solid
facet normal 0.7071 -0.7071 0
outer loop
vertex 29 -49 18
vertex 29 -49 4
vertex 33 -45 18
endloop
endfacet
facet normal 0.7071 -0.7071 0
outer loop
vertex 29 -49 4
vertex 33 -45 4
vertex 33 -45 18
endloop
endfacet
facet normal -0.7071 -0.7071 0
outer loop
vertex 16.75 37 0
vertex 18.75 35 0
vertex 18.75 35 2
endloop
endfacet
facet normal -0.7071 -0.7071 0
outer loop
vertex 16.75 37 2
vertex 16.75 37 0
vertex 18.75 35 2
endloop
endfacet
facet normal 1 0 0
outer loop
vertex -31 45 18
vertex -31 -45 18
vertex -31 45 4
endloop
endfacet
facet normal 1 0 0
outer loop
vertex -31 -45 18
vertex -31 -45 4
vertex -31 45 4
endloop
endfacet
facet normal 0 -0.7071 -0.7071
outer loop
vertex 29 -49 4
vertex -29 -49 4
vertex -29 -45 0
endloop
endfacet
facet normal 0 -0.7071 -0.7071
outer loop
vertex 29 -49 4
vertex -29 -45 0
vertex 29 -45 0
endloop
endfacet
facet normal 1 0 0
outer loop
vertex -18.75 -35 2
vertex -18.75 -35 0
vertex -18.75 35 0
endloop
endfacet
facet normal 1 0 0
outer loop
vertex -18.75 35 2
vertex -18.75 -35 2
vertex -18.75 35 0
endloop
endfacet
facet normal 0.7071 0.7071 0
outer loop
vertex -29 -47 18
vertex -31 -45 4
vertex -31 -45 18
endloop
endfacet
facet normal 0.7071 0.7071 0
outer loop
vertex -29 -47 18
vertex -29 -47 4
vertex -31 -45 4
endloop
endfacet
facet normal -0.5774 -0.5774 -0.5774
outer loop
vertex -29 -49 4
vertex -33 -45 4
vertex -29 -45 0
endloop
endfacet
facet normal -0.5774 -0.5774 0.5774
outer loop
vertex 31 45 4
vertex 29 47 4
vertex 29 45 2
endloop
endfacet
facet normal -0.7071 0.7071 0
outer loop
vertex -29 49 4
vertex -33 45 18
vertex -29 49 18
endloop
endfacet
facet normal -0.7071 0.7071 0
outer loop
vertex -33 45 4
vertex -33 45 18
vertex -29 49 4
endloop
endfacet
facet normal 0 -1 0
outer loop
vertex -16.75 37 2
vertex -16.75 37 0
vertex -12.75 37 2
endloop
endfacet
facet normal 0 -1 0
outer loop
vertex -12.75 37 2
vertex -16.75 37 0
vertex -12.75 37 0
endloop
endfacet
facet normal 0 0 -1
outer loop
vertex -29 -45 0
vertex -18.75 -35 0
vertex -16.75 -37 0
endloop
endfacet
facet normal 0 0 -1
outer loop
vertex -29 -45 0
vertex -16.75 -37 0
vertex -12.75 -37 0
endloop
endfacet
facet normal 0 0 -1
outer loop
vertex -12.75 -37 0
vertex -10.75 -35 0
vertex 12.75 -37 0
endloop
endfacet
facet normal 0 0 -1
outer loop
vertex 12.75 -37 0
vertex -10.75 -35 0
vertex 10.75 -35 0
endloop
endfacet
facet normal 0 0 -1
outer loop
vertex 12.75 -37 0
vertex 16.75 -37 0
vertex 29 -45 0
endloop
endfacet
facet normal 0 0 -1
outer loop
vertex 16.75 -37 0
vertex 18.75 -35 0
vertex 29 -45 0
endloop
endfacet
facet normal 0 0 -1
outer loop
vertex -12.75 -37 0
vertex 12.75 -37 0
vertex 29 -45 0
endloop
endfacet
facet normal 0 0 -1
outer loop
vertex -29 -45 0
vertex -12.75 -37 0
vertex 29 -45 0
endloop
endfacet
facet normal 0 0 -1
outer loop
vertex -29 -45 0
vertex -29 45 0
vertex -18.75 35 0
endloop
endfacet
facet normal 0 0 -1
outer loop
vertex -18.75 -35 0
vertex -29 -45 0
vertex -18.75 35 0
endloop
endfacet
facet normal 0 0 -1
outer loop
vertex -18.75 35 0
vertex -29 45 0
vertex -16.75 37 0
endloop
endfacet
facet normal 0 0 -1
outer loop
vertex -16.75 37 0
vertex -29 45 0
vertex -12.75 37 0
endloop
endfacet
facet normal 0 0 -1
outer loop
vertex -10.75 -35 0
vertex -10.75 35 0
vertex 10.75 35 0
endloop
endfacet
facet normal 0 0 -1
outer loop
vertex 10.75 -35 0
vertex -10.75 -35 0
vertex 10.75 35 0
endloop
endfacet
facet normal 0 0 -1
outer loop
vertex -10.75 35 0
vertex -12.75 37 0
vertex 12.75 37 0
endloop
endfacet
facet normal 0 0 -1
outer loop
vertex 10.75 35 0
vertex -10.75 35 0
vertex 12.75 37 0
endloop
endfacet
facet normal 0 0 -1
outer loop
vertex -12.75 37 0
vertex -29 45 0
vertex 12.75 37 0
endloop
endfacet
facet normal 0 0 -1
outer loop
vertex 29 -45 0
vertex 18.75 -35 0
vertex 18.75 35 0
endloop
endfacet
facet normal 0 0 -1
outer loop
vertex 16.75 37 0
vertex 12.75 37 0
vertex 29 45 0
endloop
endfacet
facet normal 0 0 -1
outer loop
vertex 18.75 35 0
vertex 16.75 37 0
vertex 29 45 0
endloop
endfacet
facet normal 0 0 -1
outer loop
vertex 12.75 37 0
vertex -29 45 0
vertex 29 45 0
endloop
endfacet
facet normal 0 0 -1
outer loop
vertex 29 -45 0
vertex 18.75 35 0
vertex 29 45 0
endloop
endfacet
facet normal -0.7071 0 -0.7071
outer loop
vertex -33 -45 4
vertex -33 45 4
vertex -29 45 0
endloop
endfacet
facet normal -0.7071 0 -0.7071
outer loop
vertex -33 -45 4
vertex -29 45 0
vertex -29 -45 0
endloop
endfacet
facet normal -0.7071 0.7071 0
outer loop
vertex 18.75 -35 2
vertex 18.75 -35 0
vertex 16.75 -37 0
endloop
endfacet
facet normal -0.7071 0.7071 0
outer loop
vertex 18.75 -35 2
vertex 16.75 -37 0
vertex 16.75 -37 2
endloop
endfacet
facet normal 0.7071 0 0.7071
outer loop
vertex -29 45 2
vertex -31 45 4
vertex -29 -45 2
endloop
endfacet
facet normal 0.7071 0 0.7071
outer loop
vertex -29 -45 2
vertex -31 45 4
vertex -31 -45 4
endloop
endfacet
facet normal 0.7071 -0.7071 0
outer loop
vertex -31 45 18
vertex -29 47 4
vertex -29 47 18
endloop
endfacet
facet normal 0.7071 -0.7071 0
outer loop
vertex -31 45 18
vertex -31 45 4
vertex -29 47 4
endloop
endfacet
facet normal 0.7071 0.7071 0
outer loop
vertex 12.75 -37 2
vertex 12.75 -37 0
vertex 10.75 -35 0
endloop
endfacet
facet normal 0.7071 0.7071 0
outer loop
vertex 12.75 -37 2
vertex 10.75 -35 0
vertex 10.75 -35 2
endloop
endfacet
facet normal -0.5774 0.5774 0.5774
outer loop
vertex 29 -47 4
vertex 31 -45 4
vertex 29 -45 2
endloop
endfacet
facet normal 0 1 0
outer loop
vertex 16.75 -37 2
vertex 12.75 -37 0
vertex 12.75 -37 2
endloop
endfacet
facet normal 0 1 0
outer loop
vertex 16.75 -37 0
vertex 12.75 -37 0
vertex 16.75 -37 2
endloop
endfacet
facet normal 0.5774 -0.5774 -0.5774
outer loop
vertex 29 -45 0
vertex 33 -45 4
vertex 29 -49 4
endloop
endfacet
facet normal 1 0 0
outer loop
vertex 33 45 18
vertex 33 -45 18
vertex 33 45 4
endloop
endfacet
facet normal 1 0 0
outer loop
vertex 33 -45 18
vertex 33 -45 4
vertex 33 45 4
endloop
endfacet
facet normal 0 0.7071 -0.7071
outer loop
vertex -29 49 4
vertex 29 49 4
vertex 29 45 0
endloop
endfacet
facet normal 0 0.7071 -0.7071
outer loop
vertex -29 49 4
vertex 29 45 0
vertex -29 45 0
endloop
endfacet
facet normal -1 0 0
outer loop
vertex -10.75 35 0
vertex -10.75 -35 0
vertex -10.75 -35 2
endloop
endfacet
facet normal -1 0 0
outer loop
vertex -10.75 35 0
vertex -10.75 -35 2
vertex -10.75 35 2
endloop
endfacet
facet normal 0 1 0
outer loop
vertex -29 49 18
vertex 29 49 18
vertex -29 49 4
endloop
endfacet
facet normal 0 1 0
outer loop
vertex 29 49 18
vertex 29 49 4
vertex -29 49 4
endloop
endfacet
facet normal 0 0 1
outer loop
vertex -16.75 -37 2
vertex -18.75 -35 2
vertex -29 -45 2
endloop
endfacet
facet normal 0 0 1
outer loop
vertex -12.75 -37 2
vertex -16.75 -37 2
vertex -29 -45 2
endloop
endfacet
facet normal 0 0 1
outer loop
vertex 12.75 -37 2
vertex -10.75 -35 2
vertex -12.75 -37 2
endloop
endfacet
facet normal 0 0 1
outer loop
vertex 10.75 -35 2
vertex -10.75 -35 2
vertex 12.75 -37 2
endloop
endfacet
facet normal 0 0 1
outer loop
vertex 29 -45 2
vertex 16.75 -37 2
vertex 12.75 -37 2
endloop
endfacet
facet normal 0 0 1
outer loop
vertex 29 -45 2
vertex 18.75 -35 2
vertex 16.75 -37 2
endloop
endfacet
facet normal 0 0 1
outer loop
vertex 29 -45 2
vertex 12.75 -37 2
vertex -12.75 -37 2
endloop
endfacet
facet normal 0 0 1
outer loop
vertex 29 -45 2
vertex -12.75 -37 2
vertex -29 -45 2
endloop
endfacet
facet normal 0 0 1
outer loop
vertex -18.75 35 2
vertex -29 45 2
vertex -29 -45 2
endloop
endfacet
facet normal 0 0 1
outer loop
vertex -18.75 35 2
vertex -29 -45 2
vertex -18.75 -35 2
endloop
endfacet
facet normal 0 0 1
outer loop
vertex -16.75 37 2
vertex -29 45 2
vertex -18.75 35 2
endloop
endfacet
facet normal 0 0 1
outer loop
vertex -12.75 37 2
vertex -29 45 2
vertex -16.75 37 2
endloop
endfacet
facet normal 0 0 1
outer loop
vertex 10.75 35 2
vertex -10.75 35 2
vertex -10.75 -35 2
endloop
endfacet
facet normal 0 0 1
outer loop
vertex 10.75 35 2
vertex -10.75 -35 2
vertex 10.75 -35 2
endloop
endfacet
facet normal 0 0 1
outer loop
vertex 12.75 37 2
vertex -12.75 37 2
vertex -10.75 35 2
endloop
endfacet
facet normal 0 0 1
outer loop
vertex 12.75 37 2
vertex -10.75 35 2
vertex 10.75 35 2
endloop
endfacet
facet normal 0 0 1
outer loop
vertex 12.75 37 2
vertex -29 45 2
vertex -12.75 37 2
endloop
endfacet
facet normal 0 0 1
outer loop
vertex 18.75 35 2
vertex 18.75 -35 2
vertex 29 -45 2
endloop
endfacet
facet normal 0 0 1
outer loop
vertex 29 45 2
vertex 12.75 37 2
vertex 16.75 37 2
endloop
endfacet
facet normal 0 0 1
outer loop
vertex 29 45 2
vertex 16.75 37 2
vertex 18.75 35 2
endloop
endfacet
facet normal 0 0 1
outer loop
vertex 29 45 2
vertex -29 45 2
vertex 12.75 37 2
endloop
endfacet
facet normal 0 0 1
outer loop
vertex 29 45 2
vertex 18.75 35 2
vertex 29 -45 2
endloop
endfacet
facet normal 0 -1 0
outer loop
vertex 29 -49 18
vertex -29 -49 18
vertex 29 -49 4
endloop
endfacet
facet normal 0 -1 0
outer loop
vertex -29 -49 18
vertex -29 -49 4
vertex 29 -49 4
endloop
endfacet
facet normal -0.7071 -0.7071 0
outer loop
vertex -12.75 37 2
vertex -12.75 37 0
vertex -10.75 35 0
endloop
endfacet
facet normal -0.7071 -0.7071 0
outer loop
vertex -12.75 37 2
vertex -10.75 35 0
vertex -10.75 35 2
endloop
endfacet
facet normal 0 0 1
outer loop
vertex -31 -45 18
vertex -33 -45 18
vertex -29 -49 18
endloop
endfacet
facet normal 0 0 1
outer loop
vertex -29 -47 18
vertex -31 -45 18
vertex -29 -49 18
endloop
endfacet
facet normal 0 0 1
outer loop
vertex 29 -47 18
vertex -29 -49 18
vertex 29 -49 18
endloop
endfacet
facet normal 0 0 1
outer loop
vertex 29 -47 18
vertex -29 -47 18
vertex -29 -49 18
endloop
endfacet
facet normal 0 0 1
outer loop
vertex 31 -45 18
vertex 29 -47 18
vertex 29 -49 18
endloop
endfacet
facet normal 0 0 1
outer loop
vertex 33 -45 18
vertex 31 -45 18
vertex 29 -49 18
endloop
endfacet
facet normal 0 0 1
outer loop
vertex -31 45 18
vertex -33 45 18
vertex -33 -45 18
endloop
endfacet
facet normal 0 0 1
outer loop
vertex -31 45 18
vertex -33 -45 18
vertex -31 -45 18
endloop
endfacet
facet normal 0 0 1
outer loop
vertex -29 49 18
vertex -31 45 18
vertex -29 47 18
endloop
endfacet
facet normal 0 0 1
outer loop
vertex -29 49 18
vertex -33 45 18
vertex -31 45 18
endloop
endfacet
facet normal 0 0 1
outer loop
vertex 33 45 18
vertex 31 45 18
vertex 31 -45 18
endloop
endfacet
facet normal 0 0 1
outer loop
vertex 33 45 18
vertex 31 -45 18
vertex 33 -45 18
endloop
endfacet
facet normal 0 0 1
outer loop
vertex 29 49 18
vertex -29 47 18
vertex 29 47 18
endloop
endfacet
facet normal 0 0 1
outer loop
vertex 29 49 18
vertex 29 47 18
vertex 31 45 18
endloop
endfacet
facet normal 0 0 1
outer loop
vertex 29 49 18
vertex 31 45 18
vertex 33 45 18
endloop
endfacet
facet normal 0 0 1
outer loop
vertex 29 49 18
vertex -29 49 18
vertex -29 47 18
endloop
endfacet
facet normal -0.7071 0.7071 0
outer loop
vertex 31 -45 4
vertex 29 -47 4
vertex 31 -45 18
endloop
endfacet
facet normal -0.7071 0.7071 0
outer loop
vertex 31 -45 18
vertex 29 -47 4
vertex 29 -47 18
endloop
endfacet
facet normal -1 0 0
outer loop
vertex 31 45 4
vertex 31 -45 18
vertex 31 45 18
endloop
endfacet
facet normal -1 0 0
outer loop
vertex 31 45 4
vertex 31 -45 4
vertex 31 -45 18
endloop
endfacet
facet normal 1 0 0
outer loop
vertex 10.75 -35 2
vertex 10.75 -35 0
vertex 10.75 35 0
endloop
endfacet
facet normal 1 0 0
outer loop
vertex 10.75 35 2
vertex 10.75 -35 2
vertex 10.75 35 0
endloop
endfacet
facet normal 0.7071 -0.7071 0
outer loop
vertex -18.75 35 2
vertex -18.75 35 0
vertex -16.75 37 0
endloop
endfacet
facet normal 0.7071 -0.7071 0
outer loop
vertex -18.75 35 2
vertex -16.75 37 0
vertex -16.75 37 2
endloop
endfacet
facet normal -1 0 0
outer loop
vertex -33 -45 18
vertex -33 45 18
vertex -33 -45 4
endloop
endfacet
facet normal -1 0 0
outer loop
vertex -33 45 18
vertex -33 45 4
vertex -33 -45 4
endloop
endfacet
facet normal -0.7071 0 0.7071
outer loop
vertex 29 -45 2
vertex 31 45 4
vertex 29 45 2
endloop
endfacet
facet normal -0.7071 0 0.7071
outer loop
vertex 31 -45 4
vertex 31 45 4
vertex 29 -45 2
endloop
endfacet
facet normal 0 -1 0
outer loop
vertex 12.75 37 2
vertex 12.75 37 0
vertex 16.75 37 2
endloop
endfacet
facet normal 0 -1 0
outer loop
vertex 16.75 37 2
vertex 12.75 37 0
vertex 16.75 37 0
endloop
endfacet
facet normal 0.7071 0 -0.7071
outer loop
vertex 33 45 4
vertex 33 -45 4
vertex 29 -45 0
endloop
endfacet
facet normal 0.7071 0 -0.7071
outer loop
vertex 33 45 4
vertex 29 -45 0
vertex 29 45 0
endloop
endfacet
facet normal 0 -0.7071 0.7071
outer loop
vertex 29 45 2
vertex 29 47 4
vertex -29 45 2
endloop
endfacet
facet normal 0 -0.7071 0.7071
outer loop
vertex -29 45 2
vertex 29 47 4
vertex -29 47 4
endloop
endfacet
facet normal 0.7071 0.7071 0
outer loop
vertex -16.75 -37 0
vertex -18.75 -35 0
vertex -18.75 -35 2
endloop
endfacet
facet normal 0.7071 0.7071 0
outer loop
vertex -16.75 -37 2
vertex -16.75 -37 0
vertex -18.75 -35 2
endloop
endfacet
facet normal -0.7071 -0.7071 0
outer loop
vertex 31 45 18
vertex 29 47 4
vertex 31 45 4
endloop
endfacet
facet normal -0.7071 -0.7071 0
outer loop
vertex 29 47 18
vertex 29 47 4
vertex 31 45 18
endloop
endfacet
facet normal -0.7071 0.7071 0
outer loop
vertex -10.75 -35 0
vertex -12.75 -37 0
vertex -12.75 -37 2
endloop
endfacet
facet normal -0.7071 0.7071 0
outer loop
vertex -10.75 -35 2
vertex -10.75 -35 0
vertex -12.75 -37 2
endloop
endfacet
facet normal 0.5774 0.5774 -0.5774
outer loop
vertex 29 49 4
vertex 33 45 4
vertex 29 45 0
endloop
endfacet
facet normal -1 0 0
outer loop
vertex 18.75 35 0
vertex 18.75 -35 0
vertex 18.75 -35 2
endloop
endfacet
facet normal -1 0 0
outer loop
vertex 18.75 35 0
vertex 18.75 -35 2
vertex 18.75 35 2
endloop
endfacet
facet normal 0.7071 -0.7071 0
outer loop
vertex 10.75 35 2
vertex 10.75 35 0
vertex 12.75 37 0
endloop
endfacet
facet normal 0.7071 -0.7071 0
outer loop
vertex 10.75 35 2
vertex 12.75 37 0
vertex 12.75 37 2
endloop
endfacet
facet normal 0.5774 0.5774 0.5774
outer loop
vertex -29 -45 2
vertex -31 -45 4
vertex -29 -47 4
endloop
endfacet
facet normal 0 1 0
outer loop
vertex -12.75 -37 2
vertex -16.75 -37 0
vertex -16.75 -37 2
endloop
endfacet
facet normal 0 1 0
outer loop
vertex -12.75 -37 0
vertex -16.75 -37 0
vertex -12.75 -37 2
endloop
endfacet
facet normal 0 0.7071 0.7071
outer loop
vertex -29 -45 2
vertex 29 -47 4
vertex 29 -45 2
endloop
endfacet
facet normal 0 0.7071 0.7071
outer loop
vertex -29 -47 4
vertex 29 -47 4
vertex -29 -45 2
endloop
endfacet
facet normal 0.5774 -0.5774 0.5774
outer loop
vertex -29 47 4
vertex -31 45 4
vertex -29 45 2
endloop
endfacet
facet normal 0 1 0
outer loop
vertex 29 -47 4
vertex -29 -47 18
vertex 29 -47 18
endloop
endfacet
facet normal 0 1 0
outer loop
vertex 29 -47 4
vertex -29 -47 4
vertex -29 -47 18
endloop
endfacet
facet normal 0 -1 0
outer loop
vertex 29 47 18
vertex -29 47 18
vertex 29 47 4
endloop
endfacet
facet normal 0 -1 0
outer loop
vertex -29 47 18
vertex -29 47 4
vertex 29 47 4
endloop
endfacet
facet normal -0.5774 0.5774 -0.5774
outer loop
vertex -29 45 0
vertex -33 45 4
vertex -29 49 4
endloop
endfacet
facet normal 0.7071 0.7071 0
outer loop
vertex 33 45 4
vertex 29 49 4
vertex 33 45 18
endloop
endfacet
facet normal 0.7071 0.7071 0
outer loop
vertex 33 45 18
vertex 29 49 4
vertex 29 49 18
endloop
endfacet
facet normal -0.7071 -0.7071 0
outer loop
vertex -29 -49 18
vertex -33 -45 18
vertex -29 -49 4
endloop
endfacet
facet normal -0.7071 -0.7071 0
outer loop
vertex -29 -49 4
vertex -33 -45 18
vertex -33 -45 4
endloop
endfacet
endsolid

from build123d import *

# Parameters (mm, degrees)
F0_W     = 62
F0_H     = 94
F0_W_2   = 8
F0_H_2   = 74
F1_DEPTH = 2
F2_DEPTH = 18
F3_SIZE  = 2
F4_SIZE  = 4


with BuildPart() as f1:
    # F0 (on Top) → F1 (new body)
    with BuildSketch(Plane.XY):
        Polygon((-33, -44), (-33, -49), (33, -49), (33, 49), (-33, 49), (-33, 44), align=None)
        Rectangle(F0_W, F0_H, mode=Mode.SUBTRACT)
        Rectangle(F0_W, F0_H)
        with Locations((-14.75, 0)):
            Rectangle(F0_W_2, F0_H_2, mode=Mode.SUBTRACT)
        with Locations((14.75, 0)):
            Rectangle(F0_W_2, F0_H_2, mode=Mode.SUBTRACT)
    extrude(amount=F1_DEPTH)

    # F0 (on Top) → F2 (join)
    with BuildSketch(Plane.XY):
        Polygon((-33, -44), (-33, -49), (33, -49), (33, 49), (-33, 49), (-33, 44), align=None)
        Rectangle(F0_W, F0_H, mode=Mode.SUBTRACT)
    extrude(amount=F2_DEPTH)

    # F3
    f3_edges = [f1.edges().sort_by_distance(p)[0] for p in [
        (31, 47, 10),
        (-31, 47, 10),
        (-31, -47, 10),
        (31, -47, 10),
        (-18.75, 37, 1),
        (10.75, 37, 1),
        (-10.75, 37, 1),
        (18.75, 37, 1),
        (-10.75, -37, 1),
        (18.75, -37, 1),
        (10.75, -37, 1),
        (-18.75, -37, 1),
        (-31, 0, 2),
        (0, 47, 2),
        (31, 0, 2),
        (0, -47, 2),
    ]]
    chamfer(f3_edges, length=F3_SIZE)

    # F4
    f4_edges = [f1.edges().sort_by_distance(p)[0] for p in [
        (-33, 49, 9),
        (33, 49, 9),
        (33, -49, 9),
        (-33, -49, 9),
        (-33, 0, 0),
        (33, 0, 0),
        (0, -49, 0),
        (0, 49, 0),
    ]]
    chamfer(f4_edges, length=F4_SIZE)


solid = f1.part
